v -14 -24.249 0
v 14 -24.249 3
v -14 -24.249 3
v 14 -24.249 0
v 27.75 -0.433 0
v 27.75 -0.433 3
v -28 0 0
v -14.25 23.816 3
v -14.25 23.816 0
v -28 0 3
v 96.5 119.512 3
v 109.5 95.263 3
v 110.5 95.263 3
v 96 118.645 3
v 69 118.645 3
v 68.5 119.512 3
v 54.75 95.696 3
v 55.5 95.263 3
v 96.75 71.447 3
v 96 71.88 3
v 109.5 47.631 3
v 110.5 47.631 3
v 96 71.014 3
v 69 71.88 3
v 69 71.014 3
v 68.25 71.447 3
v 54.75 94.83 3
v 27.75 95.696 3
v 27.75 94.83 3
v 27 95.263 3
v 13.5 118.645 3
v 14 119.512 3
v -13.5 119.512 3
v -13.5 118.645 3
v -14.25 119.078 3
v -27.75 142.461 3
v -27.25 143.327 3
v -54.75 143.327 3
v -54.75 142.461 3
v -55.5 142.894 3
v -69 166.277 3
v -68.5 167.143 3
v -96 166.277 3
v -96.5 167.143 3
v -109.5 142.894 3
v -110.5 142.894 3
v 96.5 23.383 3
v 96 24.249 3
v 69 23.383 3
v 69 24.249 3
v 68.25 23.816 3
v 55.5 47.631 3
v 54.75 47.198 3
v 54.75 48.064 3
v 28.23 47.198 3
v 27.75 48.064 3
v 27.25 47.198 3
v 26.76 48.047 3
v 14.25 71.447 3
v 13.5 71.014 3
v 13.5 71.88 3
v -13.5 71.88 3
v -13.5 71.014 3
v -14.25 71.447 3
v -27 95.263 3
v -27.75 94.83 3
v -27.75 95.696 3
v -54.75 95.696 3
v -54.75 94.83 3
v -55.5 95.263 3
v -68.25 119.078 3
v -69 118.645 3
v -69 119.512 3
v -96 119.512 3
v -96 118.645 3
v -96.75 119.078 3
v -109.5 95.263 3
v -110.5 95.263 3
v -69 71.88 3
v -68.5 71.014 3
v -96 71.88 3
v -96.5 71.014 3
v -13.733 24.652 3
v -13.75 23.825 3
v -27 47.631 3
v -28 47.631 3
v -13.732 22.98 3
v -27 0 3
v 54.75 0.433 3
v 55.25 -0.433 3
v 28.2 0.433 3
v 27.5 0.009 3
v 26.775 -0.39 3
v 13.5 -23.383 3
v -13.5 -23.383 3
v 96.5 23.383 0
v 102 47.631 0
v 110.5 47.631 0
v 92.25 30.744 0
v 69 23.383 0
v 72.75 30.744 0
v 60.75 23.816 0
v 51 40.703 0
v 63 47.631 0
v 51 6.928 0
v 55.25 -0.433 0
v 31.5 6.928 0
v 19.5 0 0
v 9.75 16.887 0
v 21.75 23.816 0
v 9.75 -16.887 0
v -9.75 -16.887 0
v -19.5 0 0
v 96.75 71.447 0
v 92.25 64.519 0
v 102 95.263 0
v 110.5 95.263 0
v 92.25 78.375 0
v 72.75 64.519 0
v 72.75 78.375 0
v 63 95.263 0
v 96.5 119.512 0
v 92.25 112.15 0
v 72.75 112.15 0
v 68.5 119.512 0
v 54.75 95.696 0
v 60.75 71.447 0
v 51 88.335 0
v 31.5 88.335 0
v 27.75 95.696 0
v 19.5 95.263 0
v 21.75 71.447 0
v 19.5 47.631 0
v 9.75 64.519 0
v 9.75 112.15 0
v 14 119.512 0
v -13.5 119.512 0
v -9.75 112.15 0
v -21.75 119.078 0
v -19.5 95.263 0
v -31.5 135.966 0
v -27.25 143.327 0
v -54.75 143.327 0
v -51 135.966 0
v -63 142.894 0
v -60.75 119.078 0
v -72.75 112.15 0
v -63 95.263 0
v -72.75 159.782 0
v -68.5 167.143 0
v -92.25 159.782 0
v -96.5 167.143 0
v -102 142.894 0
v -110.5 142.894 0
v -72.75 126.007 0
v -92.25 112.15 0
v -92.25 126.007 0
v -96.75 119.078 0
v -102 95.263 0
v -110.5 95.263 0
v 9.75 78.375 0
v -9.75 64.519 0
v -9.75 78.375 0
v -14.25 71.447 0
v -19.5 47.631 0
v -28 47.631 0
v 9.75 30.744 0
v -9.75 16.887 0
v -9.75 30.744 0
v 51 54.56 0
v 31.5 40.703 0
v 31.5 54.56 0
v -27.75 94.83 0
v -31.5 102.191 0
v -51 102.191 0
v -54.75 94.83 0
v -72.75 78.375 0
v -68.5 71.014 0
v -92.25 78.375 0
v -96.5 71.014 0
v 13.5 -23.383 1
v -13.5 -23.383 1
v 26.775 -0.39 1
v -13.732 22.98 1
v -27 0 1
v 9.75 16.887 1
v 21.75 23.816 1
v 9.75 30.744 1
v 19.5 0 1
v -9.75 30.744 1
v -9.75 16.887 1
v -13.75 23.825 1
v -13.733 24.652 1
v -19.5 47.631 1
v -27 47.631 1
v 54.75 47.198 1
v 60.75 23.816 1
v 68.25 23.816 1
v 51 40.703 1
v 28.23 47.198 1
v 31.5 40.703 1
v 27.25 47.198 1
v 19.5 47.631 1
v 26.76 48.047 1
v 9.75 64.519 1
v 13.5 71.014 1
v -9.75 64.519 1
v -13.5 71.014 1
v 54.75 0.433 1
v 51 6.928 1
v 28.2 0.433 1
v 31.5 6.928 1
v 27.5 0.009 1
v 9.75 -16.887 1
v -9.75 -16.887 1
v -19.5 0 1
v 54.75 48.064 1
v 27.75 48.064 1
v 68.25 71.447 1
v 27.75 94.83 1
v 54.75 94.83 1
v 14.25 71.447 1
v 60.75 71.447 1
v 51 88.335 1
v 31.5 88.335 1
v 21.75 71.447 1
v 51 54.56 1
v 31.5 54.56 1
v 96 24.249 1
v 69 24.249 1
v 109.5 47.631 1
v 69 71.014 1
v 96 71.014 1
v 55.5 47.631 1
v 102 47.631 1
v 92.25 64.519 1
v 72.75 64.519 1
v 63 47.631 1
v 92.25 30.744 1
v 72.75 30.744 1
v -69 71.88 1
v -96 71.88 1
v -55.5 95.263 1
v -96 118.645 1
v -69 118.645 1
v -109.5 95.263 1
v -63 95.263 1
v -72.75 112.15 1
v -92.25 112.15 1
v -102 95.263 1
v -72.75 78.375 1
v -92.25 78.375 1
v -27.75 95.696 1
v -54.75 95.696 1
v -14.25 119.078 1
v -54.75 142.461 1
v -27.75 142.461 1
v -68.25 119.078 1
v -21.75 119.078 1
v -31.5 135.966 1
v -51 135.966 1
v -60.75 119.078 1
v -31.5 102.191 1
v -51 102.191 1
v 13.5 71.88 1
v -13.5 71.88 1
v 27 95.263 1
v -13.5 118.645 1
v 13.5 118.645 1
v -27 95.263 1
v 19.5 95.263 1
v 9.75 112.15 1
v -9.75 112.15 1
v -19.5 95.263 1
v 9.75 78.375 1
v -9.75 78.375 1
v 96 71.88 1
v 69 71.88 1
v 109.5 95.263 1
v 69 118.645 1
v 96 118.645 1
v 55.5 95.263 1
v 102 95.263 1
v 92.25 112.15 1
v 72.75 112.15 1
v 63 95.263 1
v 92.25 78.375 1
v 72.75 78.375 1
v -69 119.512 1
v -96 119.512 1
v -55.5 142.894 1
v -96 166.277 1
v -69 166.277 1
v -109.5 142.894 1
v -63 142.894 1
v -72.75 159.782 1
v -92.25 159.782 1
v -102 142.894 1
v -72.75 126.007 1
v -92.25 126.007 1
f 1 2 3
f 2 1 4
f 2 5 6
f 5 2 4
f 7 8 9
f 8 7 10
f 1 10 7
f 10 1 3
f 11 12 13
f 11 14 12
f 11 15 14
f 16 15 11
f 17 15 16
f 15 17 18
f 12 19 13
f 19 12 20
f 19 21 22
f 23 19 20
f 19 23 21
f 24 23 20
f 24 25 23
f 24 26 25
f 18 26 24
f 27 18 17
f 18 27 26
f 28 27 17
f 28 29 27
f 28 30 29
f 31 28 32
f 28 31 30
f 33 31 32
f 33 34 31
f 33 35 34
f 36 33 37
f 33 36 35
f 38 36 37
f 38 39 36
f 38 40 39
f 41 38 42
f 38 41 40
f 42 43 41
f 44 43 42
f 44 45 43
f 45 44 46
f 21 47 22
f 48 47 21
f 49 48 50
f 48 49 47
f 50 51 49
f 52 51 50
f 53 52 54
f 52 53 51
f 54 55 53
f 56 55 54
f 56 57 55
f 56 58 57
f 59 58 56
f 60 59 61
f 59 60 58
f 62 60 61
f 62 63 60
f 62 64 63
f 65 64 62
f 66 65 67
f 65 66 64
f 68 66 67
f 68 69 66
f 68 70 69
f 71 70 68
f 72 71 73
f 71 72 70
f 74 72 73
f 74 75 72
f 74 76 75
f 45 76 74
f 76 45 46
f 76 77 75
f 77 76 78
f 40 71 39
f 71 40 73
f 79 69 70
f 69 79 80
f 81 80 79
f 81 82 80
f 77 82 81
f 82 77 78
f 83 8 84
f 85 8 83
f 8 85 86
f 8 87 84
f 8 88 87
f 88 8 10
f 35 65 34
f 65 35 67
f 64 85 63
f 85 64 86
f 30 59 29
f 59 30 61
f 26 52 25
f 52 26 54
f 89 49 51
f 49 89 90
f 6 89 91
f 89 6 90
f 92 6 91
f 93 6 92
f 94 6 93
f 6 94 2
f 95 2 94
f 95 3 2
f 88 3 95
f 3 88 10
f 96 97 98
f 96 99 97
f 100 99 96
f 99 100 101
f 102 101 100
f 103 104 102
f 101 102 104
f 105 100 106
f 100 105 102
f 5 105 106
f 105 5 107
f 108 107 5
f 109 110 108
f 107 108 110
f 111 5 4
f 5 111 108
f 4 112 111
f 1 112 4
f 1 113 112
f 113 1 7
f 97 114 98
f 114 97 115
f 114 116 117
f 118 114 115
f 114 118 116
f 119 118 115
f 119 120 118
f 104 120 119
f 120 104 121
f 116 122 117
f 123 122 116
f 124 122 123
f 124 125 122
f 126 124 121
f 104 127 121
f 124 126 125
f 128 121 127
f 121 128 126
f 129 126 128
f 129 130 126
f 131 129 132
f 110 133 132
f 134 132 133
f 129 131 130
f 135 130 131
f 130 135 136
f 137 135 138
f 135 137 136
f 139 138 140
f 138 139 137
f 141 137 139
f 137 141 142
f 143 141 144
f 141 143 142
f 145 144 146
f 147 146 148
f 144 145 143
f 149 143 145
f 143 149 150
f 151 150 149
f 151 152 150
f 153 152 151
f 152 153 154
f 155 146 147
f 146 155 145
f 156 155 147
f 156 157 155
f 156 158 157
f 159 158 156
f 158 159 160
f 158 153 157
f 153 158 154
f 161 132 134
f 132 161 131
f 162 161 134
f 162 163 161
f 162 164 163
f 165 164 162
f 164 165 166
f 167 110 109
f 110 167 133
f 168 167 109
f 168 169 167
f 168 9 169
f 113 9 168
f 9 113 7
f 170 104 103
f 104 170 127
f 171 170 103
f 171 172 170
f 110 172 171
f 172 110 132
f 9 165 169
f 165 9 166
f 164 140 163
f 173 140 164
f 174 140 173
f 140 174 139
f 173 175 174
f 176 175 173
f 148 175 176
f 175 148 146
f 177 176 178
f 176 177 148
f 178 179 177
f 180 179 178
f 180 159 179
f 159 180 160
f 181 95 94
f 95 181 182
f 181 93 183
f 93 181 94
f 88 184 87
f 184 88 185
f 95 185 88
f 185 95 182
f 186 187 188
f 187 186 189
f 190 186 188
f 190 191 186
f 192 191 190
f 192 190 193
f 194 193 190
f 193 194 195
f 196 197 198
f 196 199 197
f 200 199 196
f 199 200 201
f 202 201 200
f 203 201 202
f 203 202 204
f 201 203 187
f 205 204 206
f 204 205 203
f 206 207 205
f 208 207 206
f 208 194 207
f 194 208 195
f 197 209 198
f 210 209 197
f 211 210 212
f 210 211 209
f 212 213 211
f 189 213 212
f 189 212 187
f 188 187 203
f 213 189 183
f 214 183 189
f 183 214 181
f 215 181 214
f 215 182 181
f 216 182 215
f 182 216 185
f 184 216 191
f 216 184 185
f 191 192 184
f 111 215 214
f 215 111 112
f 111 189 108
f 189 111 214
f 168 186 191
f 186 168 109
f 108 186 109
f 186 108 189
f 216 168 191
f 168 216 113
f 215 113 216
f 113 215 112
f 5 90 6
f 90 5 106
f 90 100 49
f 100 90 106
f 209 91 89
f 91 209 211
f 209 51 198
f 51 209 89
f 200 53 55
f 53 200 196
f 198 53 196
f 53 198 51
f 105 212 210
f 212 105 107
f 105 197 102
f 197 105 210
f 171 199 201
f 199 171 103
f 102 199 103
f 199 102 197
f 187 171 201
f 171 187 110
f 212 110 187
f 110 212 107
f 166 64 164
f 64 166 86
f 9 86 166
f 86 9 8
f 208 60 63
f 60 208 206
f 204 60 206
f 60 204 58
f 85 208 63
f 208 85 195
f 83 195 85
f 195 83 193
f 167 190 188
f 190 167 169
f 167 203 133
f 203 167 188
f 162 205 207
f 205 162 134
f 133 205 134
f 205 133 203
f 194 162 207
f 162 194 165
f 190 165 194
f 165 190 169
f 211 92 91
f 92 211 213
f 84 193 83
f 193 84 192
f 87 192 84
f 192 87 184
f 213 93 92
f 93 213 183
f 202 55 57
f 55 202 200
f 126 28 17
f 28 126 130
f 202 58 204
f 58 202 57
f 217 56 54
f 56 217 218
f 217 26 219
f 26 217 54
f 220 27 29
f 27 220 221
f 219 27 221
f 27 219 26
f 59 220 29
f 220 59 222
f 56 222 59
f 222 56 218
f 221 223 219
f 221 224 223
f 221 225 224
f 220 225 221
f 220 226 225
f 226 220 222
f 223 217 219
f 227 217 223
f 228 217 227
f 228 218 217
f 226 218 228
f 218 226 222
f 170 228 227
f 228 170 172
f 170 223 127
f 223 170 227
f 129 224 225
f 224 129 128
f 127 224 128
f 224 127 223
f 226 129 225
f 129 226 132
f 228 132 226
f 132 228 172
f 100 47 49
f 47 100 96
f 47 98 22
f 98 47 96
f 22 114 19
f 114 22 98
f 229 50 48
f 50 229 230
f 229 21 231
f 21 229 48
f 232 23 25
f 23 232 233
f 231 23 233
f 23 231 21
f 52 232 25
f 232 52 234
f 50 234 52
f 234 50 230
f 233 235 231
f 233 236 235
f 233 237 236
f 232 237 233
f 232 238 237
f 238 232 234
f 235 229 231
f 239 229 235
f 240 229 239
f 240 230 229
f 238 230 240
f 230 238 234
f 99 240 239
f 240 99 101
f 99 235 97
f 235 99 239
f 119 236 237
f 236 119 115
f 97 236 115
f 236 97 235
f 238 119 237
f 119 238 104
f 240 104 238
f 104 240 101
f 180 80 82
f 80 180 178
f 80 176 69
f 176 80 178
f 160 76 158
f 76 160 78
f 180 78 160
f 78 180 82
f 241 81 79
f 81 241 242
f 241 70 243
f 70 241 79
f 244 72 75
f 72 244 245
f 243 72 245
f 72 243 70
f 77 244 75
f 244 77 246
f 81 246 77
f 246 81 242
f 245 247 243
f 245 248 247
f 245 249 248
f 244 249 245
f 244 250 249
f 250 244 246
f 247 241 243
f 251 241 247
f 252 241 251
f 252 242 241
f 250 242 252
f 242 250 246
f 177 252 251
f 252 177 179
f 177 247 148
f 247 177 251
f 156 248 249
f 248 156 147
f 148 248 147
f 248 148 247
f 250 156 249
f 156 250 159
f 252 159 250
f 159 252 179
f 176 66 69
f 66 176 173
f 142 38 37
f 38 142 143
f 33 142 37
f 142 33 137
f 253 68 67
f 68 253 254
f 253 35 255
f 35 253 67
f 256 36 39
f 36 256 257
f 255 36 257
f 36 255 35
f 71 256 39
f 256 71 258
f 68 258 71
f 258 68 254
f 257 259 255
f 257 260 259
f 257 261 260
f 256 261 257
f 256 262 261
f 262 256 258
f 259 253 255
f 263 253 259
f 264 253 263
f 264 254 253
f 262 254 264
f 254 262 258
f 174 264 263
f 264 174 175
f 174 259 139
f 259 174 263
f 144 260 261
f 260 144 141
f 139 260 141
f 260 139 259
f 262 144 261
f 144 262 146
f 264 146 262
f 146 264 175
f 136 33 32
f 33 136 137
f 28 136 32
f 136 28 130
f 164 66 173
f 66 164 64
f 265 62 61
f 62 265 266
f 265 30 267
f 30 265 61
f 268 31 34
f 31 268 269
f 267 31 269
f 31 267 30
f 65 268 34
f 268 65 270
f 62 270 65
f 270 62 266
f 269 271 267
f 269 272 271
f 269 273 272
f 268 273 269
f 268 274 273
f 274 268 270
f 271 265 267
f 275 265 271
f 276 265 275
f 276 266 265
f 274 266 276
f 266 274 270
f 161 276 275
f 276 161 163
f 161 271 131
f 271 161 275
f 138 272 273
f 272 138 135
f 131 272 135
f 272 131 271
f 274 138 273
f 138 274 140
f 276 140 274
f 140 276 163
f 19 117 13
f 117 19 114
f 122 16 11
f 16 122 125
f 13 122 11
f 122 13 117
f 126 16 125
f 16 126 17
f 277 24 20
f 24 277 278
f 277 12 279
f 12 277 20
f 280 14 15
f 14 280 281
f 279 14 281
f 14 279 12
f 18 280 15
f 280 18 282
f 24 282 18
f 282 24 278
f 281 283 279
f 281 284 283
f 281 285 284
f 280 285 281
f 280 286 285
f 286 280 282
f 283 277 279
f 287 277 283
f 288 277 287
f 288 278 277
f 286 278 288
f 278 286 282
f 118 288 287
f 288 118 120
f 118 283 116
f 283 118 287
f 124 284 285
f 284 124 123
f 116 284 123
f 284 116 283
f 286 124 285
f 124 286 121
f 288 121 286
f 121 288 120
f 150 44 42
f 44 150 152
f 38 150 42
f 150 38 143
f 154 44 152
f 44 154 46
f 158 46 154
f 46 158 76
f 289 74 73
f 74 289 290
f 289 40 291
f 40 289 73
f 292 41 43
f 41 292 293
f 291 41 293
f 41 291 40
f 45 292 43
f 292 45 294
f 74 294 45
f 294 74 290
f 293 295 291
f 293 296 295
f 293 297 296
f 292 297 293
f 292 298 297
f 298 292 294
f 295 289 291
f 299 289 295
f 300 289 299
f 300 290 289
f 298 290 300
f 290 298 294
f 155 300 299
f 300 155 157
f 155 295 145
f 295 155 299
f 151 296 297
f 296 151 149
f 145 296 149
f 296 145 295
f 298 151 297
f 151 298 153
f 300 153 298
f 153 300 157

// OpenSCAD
$fn = 150;

union() {
	difference() {
		union() {
			translate(v = [0.0, 0.0, 0]) {
				difference() {
					cylinder($fn = 6, d = 56.0, h = 3.0);
					translate(v = [0, 0, 1.0]) {
						cylinder($fn = 6, d = 54.0, h = 3.0);
					}
					translate(v = [0, 0, -1]) {
						cylinder($fn = 6, d = 39, h = 3.0);
					}
				}
			}
			translate(v = [41.25, 23.81569860407206, 0]) {
				difference() {
					cylinder($fn = 6, d = 56.0, h = 3.0);
					translate(v = [0, 0, 1.0]) {
						cylinder($fn = 6, d = 54.0, h = 3.0);
					}
					translate(v = [0, 0, -1]) {
						cylinder($fn = 6, d = 39, h = 3.0);
					}
				}
			}
			translate(v = [0.0, 47.63139720814412, 0]) {
				difference() {
					cylinder($fn = 6, d = 56.0, h = 3.0);
					translate(v = [0, 0, 1.0]) {
						cylinder($fn = 6, d = 54.0, h = 3.0);
					}
					translate(v = [0, 0, -1]) {
						cylinder($fn = 6, d = 39, h = 3.0);
					}
				}
			}
		}
		translate(v = [13.75, 23.824673200287624, 1.0]) {
			cylinder(d = 55.0, h = 3.5);
		}
	}
	translate(v = [41.25, 71.44709581221619, 0]) {
		difference() {
			cylinder($fn = 6, d = 56.0, h = 3.0);
			translate(v = [0, 0, 1.0]) {
				cylinder($fn = 6, d = 54.0, h = 3.0);
			}
			translate(v = [0, 0, -1]) {
				cylinder($fn = 6, d = 39, h = 3.0);
			}
		}
	}
	translate(v = [82.5, 47.63139720814412, 0]) {
		difference() {
			cylinder($fn = 6, d = 56.0, h = 3.0);
			translate(v = [0, 0, 1.0]) {
				cylinder($fn = 6, d = 54.0, h = 3.0);
			}
			translate(v = [0, 0, -1]) {
				cylinder($fn = 6, d = 39, h = 3.0);
			}
		}
	}
	translate(v = [-82.5, 95.26279441628824, 0]) {
		difference() {
			cylinder($fn = 6, d = 56.0, h = 3.0);
			translate(v = [0, 0, 1.0]) {
				cylinder($fn = 6, d = 54.0, h = 3.0);
			}
			translate(v = [0, 0, -1]) {
				cylinder($fn = 6, d = 39, h = 3.0);
			}
		}
	}
	translate(v = [-41.25, 119.0784930203603, 0]) {
		difference() {
			cylinder($fn = 6, d = 56.0, h = 3.0);
			translate(v = [0, 0, 1.0]) {
				cylinder($fn = 6, d = 54.0, h = 3.0);
			}
			translate(v = [0, 0, -1]) {
				cylinder($fn = 6, d = 39, h = 3.0);
			}
		}
	}
	translate(v = [0.0, 95.26279441628824, 0]) {
		difference() {
			cylinder($fn = 6, d = 56.0, h = 3.0);
			translate(v = [0, 0, 1.0]) {
				cylinder($fn = 6, d = 54.0, h = 3.0);
			}
			translate(v = [0, 0, -1]) {
				cylinder($fn = 6, d = 39, h = 3.0);
			}
		}
	}
	translate(v = [82.5, 95.26279441628824, 0]) {
		difference() {
			cylinder($fn = 6, d = 56.0, h = 3.0);
			translate(v = [0, 0, 1.0]) {
				cylinder($fn = 6, d = 54.0, h = 3.0);
			}
			translate(v = [0, 0, -1]) {
				cylinder($fn = 6, d = 39, h = 3.0);
			}
		}
	}
	translate(v = [-82.5, 142.89419162443238, 0]) {
		difference() {
			cylinder($fn = 6, d = 56.0, h = 3.0);
			translate(v = [0, 0, 1.0]) {
				cylinder($fn = 6, d = 54.0, h = 3.0);
			}
			translate(v = [0, 0, -1]) {
				cylinder($fn = 6, d = 39, h = 3.0);
			}
		}
	}
}
